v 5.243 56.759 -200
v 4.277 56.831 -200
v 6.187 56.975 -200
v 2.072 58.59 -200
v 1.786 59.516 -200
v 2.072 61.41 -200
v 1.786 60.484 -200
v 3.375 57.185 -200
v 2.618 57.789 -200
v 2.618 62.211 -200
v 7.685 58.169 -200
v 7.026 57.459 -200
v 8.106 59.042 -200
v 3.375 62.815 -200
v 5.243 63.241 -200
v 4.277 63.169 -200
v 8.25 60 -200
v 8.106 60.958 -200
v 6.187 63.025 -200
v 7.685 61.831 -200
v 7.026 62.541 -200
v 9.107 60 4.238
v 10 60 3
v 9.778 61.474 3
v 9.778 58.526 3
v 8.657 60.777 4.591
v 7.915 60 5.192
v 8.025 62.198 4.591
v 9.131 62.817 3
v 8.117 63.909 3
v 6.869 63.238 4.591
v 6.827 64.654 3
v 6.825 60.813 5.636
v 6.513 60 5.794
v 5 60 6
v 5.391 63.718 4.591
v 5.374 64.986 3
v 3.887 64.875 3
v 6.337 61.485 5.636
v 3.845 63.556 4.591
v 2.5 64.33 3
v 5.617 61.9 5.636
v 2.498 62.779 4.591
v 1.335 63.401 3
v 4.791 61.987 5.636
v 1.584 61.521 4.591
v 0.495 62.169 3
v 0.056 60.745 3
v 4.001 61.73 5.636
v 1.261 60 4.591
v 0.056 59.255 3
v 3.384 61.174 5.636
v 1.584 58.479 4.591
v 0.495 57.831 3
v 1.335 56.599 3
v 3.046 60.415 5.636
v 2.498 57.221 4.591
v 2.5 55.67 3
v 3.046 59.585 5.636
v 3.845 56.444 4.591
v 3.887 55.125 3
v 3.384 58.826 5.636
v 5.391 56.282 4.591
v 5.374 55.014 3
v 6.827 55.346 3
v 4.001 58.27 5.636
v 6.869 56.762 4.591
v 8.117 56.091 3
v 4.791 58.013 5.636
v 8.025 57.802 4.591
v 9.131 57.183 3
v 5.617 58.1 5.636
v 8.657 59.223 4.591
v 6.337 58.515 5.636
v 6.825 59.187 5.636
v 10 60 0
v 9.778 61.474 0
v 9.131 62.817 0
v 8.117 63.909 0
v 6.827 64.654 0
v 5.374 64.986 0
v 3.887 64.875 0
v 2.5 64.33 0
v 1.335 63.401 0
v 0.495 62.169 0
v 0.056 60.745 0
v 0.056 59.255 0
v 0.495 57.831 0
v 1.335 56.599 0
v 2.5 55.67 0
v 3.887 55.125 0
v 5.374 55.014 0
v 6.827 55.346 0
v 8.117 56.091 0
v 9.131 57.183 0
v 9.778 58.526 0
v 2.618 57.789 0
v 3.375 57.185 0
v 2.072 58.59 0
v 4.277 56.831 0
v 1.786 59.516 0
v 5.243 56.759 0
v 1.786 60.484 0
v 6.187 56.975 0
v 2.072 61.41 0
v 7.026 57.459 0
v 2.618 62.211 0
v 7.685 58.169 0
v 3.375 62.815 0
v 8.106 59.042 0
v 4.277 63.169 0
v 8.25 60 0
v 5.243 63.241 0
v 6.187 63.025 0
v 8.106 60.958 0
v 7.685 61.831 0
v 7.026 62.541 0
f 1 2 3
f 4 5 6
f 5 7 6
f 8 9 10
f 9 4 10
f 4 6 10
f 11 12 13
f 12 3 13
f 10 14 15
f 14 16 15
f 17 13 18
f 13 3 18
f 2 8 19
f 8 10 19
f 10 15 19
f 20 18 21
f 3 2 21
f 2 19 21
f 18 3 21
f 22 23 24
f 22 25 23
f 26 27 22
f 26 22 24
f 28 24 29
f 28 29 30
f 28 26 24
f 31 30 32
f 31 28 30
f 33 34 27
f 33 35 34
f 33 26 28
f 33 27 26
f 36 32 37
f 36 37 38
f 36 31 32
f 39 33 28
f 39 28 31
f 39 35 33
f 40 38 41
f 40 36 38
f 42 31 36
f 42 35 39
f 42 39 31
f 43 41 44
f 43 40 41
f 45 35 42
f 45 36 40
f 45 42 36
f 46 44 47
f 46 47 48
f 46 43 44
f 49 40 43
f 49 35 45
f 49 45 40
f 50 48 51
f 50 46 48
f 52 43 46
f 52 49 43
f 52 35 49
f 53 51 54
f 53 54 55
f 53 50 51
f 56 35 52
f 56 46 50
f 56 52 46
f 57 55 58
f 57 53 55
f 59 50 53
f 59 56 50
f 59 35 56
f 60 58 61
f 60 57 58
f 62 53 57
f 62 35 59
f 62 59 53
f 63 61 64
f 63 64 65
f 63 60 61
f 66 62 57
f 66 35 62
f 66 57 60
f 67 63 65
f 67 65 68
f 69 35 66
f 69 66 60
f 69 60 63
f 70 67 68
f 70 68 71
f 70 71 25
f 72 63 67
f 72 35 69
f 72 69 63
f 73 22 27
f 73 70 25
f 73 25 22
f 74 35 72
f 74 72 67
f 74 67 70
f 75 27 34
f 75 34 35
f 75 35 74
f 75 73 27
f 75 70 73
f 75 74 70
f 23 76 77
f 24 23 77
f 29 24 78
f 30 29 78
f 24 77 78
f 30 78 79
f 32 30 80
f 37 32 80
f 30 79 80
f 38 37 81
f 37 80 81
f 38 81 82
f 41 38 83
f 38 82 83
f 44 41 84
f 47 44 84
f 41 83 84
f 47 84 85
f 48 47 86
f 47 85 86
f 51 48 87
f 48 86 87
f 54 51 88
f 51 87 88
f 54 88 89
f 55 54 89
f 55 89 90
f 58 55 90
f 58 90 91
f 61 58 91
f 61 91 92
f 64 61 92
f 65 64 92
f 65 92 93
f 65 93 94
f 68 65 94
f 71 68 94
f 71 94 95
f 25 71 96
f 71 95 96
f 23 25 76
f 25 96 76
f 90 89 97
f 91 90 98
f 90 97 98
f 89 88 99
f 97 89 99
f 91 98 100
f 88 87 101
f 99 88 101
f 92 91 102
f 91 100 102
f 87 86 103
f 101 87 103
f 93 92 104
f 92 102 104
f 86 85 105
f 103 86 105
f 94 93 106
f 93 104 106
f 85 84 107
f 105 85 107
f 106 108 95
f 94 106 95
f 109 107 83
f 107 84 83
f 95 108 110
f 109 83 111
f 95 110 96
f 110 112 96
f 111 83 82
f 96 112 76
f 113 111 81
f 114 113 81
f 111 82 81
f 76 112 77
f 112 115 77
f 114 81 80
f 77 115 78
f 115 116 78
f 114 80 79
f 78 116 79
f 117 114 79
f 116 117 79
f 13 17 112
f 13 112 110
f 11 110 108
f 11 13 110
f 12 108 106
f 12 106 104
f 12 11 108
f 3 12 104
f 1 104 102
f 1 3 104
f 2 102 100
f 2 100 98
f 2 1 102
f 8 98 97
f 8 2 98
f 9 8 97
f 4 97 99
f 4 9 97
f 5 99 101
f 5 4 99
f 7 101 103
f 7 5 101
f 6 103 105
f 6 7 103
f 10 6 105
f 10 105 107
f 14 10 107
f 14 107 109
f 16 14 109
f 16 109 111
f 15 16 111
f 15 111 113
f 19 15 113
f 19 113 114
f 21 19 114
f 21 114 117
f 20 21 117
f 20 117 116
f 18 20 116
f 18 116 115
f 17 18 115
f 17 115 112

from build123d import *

# Parameters (mm, degrees)
SKETCH2_R           = 3.25
SKETCH8_R           = 5
BOSS_EXTRUDE1_DEPTH = 3
DOME1_FACE_RADIUS   = 5
DOME1_HEIGHT        = 3


with BuildPart() as part:
    # Sweep1: sweep along a path in Sketch7
    with BuildLine(Plane(origin=(0, 0, 0), x_dir=(0, 0, -1), z_dir=(1, 0, 0))) as sweep1_path:
        Line((0, 0), (200, 0))
    # Sketch2 → Sweep1 (sweep)
    with BuildSketch(Plane.XY):
        with Locations((5, 60)):
            Circle(SKETCH2_R)
    sweep(path=sweep1_path.line)

    # Sketch8 → Boss-Extrude1 (add)
    with BuildSketch(Plane.XY):
        with Locations((5, 60)):
            Circle(SKETCH8_R)
    extrude(amount=BOSS_EXTRUDE1_DEPTH)

    # Dome1: a dome of height H over a round flat face of radius A is a cap of a sphere of radius (A * A + H * H) / (2 * H)
    dome1_r = (DOME1_FACE_RADIUS * DOME1_FACE_RADIUS + DOME1_HEIGHT * DOME1_HEIGHT) / (2 * DOME1_HEIGHT)
    dome1_base = Plane((5, 60, 3), z_dir=(0, 0, 1))
    with Locations(dome1_base.offset(DOME1_HEIGHT - dome1_r)):
        dome1_ball = Sphere(dome1_r, mode=Mode.PRIVATE)
    add(split(dome1_ball, bisect_by=dome1_base, keep=Keep.TOP, mode=Mode.PRIVATE))


solid = part.part
